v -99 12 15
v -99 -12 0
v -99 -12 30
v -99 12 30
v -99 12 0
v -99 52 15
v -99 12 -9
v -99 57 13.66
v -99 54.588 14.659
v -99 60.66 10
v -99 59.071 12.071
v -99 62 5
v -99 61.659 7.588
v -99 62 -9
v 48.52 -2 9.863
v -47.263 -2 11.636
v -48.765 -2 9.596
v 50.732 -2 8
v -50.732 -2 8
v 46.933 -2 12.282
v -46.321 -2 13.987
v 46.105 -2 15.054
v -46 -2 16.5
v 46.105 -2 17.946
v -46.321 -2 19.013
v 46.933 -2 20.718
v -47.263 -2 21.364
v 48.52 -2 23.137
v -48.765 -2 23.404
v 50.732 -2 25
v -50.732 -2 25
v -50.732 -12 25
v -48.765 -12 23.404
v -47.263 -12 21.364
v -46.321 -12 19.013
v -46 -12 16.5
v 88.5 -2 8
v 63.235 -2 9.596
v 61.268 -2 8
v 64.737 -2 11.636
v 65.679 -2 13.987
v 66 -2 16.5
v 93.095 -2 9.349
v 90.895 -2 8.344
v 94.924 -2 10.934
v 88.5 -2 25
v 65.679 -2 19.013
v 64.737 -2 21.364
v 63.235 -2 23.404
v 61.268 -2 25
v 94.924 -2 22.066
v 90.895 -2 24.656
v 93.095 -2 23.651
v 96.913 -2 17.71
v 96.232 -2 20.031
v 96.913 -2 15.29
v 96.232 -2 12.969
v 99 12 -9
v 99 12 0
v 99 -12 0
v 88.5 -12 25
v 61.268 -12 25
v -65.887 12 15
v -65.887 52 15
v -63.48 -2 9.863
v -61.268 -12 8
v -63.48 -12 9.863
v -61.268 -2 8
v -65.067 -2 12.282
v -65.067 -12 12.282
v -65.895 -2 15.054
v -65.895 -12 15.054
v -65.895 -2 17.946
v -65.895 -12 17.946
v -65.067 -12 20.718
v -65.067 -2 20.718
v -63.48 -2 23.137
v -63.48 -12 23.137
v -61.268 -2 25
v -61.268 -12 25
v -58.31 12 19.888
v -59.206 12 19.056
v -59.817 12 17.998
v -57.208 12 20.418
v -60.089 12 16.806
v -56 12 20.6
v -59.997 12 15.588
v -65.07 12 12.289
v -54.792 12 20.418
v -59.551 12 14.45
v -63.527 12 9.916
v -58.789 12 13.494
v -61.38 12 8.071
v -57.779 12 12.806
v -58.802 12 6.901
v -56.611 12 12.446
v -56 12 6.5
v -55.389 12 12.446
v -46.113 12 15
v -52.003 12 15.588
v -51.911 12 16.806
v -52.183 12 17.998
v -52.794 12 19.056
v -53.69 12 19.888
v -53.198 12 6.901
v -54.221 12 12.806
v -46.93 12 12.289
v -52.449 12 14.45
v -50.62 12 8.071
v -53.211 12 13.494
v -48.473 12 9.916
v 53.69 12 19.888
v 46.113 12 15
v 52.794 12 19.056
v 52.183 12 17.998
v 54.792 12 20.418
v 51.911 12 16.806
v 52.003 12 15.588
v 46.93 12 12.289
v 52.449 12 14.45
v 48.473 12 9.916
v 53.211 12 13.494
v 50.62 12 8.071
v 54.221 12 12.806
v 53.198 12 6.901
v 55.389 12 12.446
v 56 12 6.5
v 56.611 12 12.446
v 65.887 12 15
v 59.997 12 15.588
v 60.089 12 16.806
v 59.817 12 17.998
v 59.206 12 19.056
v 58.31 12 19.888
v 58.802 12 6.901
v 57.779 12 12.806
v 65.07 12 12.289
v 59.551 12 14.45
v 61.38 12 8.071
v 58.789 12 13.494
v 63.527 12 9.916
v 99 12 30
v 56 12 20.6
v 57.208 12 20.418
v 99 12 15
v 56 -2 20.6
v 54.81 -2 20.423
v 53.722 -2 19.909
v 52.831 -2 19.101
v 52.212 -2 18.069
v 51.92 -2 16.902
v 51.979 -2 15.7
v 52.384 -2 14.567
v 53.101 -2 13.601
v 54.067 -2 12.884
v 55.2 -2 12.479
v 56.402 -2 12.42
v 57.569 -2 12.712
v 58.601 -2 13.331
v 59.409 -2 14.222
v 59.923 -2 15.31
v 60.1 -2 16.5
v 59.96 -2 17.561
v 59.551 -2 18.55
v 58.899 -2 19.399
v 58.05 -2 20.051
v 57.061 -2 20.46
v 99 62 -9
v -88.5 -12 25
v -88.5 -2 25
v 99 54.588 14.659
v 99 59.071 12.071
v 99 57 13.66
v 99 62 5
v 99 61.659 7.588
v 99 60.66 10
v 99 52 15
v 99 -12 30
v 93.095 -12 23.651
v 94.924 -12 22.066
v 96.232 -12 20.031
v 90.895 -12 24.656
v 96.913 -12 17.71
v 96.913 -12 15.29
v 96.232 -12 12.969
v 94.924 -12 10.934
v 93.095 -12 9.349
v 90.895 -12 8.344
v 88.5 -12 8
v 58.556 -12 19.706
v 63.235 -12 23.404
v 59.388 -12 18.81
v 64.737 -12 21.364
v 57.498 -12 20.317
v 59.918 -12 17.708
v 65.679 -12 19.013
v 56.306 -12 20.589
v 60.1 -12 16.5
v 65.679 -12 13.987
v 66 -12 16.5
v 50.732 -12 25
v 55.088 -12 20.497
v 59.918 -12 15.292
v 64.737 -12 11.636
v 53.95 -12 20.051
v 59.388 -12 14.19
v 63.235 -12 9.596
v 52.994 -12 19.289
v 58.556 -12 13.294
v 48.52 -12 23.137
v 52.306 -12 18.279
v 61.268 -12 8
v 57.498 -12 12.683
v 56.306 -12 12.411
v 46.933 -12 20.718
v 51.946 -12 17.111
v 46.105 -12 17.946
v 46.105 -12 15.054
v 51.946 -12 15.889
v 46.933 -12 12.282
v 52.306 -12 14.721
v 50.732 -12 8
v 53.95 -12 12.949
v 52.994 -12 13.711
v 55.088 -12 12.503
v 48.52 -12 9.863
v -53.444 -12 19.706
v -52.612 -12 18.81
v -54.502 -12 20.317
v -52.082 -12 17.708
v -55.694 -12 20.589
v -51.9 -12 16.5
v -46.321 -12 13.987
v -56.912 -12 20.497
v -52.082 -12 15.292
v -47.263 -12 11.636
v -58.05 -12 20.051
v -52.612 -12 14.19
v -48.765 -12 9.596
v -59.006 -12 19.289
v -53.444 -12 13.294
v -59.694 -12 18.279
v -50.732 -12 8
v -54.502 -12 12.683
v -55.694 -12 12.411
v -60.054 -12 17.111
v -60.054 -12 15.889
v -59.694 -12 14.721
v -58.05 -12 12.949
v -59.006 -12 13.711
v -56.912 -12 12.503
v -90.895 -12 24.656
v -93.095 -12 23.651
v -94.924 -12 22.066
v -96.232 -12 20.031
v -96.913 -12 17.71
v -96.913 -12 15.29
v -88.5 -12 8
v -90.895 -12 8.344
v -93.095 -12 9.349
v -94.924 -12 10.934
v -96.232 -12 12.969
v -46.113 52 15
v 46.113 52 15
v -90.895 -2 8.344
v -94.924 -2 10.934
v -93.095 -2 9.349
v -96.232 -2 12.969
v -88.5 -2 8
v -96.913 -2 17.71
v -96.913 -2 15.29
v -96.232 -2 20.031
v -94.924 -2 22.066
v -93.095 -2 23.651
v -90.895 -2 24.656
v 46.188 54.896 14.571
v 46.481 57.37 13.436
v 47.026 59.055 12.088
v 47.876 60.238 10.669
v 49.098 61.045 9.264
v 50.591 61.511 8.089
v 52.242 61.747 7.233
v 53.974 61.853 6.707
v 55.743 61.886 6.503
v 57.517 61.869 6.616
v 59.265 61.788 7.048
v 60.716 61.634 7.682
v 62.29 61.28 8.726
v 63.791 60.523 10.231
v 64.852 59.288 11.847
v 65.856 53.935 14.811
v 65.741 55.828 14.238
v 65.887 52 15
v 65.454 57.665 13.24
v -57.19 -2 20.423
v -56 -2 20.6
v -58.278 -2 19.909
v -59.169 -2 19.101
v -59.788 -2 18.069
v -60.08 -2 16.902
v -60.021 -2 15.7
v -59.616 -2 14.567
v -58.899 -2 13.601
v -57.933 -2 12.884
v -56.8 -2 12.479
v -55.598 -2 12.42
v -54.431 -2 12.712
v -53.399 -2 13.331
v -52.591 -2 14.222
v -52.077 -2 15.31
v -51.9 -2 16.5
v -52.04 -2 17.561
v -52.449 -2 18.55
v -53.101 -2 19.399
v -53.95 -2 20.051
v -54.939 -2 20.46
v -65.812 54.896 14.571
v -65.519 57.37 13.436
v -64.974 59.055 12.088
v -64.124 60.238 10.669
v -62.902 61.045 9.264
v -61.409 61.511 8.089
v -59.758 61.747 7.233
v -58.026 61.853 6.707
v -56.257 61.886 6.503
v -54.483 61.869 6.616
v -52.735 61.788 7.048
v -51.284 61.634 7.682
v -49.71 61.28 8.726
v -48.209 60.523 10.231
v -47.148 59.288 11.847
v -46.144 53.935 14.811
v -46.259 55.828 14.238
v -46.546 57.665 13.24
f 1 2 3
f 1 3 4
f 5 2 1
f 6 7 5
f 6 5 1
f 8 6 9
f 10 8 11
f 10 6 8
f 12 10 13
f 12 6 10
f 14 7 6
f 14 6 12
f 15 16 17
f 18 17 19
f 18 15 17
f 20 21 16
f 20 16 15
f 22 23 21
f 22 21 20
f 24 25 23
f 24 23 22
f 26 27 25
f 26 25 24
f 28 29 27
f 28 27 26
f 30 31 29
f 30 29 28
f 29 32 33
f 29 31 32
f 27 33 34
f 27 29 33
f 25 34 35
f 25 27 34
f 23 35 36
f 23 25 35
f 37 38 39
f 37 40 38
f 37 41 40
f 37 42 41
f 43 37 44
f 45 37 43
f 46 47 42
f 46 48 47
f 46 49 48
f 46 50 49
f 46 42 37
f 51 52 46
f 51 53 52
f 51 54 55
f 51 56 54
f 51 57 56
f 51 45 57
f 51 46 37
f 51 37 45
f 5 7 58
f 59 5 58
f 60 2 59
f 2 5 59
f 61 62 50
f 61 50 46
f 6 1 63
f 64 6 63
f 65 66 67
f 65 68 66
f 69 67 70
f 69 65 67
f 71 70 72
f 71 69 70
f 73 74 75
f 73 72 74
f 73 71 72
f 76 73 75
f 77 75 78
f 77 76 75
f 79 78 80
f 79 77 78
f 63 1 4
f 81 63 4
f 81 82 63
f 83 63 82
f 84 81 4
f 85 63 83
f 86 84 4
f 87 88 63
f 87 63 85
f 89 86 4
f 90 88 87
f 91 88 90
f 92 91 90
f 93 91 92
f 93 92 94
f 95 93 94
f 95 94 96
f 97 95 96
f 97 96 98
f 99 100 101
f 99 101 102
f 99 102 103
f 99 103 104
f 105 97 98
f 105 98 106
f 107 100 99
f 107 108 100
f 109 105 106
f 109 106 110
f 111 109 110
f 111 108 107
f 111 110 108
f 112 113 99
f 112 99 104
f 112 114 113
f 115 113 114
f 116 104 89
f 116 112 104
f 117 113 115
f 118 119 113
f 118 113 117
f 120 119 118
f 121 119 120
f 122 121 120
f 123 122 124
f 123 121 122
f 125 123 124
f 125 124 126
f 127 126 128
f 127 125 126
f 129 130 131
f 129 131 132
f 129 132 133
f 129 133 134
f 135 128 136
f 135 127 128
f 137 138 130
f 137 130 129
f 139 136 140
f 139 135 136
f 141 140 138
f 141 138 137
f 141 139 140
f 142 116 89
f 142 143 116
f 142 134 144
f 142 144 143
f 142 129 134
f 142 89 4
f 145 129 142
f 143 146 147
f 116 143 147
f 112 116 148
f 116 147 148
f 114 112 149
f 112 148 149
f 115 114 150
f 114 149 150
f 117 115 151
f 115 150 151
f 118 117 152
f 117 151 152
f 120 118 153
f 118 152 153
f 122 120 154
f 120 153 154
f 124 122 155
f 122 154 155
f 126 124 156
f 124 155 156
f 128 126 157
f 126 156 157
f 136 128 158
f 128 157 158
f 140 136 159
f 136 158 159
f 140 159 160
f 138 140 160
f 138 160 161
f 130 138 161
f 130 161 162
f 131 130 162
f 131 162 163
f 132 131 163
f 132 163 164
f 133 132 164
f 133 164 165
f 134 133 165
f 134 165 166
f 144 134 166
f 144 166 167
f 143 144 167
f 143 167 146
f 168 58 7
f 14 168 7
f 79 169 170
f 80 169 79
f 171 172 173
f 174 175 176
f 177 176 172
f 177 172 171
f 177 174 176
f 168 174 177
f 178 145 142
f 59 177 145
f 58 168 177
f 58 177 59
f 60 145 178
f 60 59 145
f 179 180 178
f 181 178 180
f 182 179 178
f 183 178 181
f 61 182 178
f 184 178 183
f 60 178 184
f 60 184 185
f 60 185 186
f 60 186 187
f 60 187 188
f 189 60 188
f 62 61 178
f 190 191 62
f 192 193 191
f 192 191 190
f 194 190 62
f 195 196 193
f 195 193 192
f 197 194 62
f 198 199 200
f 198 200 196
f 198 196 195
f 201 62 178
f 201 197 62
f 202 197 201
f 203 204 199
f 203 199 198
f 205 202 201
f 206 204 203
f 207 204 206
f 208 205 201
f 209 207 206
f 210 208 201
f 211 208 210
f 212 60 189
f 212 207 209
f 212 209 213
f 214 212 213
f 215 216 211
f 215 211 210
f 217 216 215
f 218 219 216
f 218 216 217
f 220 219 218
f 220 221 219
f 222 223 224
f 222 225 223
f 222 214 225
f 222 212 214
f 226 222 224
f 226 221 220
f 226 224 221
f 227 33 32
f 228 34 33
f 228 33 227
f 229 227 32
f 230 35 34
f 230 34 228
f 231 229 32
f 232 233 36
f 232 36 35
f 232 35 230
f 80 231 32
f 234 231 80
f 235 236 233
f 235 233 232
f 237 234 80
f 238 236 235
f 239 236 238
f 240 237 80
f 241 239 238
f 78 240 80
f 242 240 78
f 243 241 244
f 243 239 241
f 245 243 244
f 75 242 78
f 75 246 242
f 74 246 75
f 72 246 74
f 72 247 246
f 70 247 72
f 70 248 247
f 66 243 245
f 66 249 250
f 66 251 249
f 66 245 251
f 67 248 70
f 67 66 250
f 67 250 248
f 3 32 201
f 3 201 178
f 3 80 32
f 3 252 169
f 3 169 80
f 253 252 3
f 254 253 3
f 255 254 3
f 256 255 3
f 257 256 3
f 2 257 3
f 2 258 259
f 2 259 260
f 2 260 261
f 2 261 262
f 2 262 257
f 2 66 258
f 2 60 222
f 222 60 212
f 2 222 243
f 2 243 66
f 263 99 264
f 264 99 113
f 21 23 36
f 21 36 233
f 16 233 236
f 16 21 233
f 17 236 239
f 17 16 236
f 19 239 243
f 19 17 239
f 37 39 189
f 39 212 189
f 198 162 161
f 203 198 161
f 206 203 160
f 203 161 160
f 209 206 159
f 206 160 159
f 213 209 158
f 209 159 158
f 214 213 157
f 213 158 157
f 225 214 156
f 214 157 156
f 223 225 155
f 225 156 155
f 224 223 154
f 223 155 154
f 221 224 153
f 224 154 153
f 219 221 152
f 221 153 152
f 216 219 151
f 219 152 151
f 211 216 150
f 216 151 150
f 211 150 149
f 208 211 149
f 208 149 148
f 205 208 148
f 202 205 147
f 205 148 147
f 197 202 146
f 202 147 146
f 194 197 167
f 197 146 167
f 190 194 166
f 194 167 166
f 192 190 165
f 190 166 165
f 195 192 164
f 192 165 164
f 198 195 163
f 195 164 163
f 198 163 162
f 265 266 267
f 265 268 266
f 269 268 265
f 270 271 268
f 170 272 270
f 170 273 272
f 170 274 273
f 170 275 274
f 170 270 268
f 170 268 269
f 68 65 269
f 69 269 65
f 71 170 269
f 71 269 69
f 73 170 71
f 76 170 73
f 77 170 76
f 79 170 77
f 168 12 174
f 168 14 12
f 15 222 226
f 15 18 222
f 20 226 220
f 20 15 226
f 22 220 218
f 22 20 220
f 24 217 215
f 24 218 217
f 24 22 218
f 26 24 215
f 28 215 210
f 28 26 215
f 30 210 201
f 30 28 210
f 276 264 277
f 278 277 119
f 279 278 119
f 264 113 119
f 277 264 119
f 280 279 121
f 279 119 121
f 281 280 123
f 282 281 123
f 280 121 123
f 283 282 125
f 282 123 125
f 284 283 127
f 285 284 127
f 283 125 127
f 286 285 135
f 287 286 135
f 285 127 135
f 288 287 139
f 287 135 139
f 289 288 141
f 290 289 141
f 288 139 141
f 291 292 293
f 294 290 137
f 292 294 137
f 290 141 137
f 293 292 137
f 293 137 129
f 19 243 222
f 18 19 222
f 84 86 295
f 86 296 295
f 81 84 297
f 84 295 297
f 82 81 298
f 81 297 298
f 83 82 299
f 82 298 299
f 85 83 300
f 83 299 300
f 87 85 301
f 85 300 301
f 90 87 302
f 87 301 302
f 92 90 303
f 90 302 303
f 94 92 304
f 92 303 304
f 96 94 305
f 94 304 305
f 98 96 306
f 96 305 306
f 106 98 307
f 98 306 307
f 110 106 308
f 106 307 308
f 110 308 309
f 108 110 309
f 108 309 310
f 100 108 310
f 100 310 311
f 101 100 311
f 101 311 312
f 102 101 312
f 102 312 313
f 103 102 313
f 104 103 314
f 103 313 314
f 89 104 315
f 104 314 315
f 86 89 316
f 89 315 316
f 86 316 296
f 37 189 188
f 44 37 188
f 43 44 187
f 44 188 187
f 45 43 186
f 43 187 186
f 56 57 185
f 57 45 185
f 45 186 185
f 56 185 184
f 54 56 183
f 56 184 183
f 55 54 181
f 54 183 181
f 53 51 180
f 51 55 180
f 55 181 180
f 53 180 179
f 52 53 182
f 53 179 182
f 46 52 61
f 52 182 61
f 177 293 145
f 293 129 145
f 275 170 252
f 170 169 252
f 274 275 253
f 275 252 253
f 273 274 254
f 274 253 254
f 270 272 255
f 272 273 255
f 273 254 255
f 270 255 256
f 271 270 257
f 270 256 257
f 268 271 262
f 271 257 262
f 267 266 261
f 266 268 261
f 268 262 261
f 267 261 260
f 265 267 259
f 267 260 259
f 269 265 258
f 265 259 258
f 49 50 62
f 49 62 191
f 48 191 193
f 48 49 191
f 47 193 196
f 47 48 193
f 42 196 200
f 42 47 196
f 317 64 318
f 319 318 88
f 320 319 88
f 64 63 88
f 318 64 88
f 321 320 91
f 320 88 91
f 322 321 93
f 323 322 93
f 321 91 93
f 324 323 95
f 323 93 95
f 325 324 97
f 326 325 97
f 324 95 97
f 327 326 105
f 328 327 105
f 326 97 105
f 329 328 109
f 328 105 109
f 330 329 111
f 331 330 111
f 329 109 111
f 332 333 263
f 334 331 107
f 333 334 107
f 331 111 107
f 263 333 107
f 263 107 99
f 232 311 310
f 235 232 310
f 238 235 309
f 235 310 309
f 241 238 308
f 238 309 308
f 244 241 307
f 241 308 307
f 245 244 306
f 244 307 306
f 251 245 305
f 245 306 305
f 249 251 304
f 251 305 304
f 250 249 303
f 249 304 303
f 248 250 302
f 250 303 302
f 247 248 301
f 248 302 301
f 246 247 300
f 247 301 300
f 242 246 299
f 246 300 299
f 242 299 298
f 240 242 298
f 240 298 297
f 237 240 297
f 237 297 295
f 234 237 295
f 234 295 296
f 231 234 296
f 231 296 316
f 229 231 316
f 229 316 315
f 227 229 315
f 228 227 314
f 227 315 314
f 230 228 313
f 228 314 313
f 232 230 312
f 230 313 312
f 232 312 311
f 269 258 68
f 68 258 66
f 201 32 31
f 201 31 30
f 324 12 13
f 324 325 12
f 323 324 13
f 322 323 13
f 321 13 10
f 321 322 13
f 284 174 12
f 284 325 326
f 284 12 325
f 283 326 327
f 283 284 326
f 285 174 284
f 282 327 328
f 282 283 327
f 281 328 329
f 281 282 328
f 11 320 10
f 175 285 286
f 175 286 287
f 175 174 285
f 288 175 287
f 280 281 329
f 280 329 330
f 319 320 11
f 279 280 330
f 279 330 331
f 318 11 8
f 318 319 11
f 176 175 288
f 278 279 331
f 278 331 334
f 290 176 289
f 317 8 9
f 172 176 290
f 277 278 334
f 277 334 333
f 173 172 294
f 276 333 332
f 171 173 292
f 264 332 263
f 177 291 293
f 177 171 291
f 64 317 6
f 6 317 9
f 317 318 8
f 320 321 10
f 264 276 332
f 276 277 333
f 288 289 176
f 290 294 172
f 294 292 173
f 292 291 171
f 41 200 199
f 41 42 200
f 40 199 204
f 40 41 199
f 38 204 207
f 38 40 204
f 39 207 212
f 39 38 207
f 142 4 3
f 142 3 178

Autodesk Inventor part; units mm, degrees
ref_plane "YZ Plane" through (0, 0, 0) normal (1, 0, 0) x (0, 1, 0)
ref_plane "XZ Plane" through (0, 0, 0) normal (0, 1, 0) x (-1, 0, 0)
ref_plane "XY Plane" through (0, 0, 0) normal (0, 0, 1) x (1, 0, 0)
sketch "Sketch1" plane through (0, 0, 0) normal (0, 0, 1) x (1, 0, 0)
  line L0 (-99, 12) -> (99, 12)
  line L1 (99, 12) -> (99, -12)
  line L2 (99, -12) -> (-99, -12)
  line L3 (-99, -12) -> (-99, 12)
  line L4 (-99, 12) -> (99, -12) construction
  line L5 (99, 12) -> (-99, -12) construction
  point P0 (0, 0)
  dimension "d0" = 24
  dimension "d1" = 198
extrude "Extrusion1" add sketch "Sketch1" along normal blind 30
sketch "Sketch2" plane through (-99, 12, 0) normal (0, 1, 0) x (1, 0, 0)
  line L0 (0, 0) -> (0, -30) projected
  line L1 (0, -15) -> (198, -15)
  line L2 (198, -15) -> (198, 9)
  line L3 (198, 9) -> (0, 9)
  line L4 (0, 9) -> (0, -15)
  line L5 (198, 0) -> (198, -30) projected
  line L6 (198, 0) -> (0, 0) projected
  point P0 (99, 0)
  dimension "d4" = 9
extrude "Extrusion2" add sketch "Sketch2" along normal blind 50
fillet "Fillet1" radius 10 1 edges at (0, 62, 15)
sketch "Sketch3" plane through (-99, 62, 0) normal (0, 1, 0) x (1, 0, 0)
  line L0 (0, -30) -> (198, -30) projected
  line L1 (198, 0) -> (198, -30) projected
  line L2 (155, -16.5) -> (198, -16.5) construction
  line L3 (43, -16.5) -> (0, -16.5) construction
  line L4 (0, -15) -> (0, -30) projected
  point P0 (99, 0)
  dimension "d17" = 13.5
  dimension "d19" = 13.5
  dimension "d21" = 112
hole "Hole1" at (56, 62, 16.5) at (-56, 62, 16.5) direction (0, -1, 0) diameter 8.2 end through all counterbore diameter 20 counterbore depth 50
sketch "Sketch4" plane through (-99, -12, 0) normal (0, -1, 0) x (1, 0, 0)
  line L0 (198, 16.5) -> (0, 16.5) construction
  line L1 (0, 0) -> (0, 30) projected
  line L2 (198, 0) -> (198, 30) projected
  line L3 (0, 30) -> (198, 30) projected
  circle A0 centre (155, 16.5) radius 4.1
  circle A1 centre (155, 16.5) radius 4.1 projected
  line L4 (10.5, 25) -> (187.5, 25)
  line L5 (10.5, 8) -> (187.5, 8)
  arc A2 (187.5, 8) -> (187.5, 25) centre (187.5, 16.5) ccw
  arc A3 (10.5, 25) -> (10.5, 8) centre (10.5, 16.5) ccw
  line L6 (10.5, 16.5) -> (0, 16.5)
  line L7 (187.5, 16.5) -> (198, 16.5)
  point P0 (99, 0)
  point P1 (15, 16.5)
  point P2 (99, 16.5)
  point P3 (127, 16.5)
  point P4 (183, 16.5)
  point P5 (71, 16.5)
  dimension "d23" = 56
  dimension "d24" = 28
  dimension "d26" = 28
  dimension "d27" = 28
  dimension "d28" = 56
  dimension "d37" = 17
  dimension "d38" = 177
extrude "Extrusion3" cut sketch "Sketch4" against normal blind 10 contours A3 L4 A2 L5
sketch "Sketch5" plane through (-99, -2, 0) normal (0, -1, 0) x (1, 0, 0)
  circle A0 centre (43, 16.5) radius 10
  circle A1 centre (43, 16.5) radius 4.1 projected
  circle A2 centre (155, 16.5) radius 10
  circle A3 centre (155, 16.5) radius 4.1 projected
  circle A4 centre (43, 16.5) radius 4.1
  circle A5 centre (155, 16.5) radius 4.1
  point P0 (99, 0)
  dimension "d41" = 20
extrude "Extrusion4" add sketch "Sketch5" along normal blind 10
properties part number "13042026-15"
